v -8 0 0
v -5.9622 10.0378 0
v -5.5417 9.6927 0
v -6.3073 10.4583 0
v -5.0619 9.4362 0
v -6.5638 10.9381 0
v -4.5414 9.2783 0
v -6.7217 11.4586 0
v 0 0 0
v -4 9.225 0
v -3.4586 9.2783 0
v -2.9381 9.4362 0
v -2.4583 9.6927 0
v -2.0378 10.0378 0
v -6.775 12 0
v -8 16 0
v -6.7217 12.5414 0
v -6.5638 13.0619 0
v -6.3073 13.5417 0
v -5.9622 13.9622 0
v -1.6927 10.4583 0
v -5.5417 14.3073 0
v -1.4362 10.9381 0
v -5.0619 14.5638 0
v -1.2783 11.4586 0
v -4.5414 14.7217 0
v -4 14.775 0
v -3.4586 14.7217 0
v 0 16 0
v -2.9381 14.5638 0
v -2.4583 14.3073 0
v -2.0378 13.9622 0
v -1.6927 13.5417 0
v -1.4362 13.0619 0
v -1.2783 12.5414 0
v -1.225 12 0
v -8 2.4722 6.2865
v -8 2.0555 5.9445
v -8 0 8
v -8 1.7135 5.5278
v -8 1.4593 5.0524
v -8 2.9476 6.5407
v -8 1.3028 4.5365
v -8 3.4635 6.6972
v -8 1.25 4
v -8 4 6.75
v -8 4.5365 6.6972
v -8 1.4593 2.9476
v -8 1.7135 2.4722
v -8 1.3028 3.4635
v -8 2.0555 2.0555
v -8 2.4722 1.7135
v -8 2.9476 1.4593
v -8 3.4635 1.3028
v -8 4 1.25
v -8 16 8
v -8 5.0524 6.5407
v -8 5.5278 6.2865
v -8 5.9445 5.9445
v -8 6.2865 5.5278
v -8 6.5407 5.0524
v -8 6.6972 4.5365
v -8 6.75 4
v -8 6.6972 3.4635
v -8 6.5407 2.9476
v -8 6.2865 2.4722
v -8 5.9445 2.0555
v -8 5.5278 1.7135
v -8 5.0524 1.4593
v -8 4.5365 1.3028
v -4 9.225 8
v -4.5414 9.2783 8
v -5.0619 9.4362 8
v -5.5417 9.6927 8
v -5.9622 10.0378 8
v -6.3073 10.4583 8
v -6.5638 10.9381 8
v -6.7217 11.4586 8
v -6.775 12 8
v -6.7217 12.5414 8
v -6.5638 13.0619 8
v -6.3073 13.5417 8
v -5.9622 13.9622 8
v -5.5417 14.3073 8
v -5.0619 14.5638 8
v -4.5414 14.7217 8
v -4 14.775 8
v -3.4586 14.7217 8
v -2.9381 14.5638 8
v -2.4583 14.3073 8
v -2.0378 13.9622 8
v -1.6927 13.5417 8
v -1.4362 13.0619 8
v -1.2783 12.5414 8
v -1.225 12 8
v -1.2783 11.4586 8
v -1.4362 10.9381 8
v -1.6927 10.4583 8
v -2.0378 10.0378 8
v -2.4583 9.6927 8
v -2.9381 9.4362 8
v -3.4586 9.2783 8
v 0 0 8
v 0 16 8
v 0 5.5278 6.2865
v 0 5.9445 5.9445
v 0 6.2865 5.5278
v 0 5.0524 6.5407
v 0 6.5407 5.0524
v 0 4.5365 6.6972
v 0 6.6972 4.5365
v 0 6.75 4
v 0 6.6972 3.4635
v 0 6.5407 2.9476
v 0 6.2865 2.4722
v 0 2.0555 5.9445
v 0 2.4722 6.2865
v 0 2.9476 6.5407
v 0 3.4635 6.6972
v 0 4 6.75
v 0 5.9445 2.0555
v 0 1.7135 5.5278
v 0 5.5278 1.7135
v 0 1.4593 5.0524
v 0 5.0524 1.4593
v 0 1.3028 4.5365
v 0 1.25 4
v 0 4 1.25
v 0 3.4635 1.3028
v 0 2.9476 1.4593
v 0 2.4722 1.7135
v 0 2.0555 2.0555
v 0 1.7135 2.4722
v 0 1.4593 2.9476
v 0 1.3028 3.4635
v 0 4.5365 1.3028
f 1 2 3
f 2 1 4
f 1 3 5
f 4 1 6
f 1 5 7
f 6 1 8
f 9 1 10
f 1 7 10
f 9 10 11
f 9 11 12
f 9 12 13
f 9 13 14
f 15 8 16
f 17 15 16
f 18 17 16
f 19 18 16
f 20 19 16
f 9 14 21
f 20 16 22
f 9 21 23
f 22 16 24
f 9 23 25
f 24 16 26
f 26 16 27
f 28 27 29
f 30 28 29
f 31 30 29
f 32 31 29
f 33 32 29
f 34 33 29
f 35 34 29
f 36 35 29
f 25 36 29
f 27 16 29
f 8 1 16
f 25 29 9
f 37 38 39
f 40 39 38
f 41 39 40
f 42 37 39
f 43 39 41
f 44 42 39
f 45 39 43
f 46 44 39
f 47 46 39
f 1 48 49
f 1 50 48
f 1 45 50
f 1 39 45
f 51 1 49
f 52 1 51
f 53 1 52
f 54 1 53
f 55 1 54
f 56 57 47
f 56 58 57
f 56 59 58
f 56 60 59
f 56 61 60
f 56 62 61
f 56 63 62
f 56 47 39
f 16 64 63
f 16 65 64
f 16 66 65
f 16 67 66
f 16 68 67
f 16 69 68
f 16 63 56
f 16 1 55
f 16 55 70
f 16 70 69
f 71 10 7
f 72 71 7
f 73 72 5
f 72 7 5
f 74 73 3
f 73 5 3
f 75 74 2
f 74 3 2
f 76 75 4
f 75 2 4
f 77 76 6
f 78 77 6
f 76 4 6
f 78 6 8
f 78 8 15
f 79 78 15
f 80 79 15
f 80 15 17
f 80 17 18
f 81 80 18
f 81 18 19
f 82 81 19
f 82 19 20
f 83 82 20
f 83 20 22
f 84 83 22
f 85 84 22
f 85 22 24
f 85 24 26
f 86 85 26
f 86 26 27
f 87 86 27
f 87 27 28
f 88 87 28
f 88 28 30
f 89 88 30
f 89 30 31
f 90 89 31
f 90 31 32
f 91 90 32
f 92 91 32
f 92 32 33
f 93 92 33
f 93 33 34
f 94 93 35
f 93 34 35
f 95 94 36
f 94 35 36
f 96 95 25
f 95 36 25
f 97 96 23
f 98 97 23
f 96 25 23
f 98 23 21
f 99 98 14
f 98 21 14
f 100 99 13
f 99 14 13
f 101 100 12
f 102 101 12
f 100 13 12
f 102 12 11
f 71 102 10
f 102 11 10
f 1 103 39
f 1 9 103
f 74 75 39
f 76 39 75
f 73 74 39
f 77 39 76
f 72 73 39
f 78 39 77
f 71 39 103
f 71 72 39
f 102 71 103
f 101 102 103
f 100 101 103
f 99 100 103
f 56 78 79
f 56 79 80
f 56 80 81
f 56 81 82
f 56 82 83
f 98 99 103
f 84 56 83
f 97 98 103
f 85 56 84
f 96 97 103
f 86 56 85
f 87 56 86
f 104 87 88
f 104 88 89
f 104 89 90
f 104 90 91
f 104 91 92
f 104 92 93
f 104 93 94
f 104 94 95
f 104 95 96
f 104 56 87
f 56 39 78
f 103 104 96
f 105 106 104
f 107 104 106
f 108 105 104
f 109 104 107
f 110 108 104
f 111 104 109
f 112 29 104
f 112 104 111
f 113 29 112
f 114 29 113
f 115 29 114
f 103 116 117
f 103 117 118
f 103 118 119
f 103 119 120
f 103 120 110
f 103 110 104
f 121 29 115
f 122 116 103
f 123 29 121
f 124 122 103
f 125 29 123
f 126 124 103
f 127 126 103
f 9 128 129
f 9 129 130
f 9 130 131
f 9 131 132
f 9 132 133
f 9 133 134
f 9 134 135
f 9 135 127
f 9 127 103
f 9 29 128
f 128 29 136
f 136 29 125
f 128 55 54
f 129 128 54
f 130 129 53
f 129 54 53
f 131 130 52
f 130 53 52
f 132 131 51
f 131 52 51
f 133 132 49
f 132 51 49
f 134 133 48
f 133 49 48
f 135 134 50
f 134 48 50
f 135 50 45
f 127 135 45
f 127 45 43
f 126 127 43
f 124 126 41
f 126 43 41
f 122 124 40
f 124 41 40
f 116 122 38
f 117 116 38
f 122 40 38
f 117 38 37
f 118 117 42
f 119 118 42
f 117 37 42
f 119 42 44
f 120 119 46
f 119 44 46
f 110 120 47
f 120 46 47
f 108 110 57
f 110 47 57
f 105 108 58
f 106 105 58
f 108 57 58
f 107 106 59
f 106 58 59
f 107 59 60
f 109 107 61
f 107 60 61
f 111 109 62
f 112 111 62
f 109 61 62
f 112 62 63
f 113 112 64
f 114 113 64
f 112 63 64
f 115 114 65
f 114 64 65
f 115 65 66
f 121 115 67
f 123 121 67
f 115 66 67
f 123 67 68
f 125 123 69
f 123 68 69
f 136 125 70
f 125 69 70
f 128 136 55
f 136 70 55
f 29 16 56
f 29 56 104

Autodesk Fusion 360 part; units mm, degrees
sketch "スケッチ1" plane through (0, 0, 0) normal (0, 0, 1) x (1, 0, 0)
  line L0 (0, 0) -> (-8, 0)
  line L1 (-8, 0) -> (-8, 16)
  line L2 (-8, 16) -> (0, 16)
  line L3 (0, 16) -> (0, 0)
  dimension "d1" = 8
  dimension "d2" = 16
extrude "押し出し1" add sketch "スケッチ1" along normal blind 8
sketch "スケッチ2" plane through (0, 0, 0) normal (1, 0, 0) x (0, 1, 0)
  line L0 (0, 0) -> (16, 0)
  line L1 (16, 0) -> (16, 8)
  line L2 (16, 8) -> (0, 8)
  line L3 (0, 8) -> (0, 0)
  point P0 (4, 4)
  dimension "d5" = 4
  dimension "d6" = 4
hole "穴1" at (0, 4, 4) direction (-1, 0, 0) diameter 5.5 depth 10 tip angle 118
sketch "スケッチ3" plane through (0, 0, 8) normal (0, 0, 1) x (-1, 0, 0)
  line L0 (0, -16) -> (8, -16)
  line L1 (8, -16) -> (8, 0)
  line L2 (8, 0) -> (0, 0)
  line L3 (0, 0) -> (0, -16)
  point P0 (4, -12)
  dimension "d10" = 4
  dimension "d11" = 4
hole "穴2" at (-4, 12, 8) direction (0, 0, -1) diameter 5.55 depth 10 tip angle 118
